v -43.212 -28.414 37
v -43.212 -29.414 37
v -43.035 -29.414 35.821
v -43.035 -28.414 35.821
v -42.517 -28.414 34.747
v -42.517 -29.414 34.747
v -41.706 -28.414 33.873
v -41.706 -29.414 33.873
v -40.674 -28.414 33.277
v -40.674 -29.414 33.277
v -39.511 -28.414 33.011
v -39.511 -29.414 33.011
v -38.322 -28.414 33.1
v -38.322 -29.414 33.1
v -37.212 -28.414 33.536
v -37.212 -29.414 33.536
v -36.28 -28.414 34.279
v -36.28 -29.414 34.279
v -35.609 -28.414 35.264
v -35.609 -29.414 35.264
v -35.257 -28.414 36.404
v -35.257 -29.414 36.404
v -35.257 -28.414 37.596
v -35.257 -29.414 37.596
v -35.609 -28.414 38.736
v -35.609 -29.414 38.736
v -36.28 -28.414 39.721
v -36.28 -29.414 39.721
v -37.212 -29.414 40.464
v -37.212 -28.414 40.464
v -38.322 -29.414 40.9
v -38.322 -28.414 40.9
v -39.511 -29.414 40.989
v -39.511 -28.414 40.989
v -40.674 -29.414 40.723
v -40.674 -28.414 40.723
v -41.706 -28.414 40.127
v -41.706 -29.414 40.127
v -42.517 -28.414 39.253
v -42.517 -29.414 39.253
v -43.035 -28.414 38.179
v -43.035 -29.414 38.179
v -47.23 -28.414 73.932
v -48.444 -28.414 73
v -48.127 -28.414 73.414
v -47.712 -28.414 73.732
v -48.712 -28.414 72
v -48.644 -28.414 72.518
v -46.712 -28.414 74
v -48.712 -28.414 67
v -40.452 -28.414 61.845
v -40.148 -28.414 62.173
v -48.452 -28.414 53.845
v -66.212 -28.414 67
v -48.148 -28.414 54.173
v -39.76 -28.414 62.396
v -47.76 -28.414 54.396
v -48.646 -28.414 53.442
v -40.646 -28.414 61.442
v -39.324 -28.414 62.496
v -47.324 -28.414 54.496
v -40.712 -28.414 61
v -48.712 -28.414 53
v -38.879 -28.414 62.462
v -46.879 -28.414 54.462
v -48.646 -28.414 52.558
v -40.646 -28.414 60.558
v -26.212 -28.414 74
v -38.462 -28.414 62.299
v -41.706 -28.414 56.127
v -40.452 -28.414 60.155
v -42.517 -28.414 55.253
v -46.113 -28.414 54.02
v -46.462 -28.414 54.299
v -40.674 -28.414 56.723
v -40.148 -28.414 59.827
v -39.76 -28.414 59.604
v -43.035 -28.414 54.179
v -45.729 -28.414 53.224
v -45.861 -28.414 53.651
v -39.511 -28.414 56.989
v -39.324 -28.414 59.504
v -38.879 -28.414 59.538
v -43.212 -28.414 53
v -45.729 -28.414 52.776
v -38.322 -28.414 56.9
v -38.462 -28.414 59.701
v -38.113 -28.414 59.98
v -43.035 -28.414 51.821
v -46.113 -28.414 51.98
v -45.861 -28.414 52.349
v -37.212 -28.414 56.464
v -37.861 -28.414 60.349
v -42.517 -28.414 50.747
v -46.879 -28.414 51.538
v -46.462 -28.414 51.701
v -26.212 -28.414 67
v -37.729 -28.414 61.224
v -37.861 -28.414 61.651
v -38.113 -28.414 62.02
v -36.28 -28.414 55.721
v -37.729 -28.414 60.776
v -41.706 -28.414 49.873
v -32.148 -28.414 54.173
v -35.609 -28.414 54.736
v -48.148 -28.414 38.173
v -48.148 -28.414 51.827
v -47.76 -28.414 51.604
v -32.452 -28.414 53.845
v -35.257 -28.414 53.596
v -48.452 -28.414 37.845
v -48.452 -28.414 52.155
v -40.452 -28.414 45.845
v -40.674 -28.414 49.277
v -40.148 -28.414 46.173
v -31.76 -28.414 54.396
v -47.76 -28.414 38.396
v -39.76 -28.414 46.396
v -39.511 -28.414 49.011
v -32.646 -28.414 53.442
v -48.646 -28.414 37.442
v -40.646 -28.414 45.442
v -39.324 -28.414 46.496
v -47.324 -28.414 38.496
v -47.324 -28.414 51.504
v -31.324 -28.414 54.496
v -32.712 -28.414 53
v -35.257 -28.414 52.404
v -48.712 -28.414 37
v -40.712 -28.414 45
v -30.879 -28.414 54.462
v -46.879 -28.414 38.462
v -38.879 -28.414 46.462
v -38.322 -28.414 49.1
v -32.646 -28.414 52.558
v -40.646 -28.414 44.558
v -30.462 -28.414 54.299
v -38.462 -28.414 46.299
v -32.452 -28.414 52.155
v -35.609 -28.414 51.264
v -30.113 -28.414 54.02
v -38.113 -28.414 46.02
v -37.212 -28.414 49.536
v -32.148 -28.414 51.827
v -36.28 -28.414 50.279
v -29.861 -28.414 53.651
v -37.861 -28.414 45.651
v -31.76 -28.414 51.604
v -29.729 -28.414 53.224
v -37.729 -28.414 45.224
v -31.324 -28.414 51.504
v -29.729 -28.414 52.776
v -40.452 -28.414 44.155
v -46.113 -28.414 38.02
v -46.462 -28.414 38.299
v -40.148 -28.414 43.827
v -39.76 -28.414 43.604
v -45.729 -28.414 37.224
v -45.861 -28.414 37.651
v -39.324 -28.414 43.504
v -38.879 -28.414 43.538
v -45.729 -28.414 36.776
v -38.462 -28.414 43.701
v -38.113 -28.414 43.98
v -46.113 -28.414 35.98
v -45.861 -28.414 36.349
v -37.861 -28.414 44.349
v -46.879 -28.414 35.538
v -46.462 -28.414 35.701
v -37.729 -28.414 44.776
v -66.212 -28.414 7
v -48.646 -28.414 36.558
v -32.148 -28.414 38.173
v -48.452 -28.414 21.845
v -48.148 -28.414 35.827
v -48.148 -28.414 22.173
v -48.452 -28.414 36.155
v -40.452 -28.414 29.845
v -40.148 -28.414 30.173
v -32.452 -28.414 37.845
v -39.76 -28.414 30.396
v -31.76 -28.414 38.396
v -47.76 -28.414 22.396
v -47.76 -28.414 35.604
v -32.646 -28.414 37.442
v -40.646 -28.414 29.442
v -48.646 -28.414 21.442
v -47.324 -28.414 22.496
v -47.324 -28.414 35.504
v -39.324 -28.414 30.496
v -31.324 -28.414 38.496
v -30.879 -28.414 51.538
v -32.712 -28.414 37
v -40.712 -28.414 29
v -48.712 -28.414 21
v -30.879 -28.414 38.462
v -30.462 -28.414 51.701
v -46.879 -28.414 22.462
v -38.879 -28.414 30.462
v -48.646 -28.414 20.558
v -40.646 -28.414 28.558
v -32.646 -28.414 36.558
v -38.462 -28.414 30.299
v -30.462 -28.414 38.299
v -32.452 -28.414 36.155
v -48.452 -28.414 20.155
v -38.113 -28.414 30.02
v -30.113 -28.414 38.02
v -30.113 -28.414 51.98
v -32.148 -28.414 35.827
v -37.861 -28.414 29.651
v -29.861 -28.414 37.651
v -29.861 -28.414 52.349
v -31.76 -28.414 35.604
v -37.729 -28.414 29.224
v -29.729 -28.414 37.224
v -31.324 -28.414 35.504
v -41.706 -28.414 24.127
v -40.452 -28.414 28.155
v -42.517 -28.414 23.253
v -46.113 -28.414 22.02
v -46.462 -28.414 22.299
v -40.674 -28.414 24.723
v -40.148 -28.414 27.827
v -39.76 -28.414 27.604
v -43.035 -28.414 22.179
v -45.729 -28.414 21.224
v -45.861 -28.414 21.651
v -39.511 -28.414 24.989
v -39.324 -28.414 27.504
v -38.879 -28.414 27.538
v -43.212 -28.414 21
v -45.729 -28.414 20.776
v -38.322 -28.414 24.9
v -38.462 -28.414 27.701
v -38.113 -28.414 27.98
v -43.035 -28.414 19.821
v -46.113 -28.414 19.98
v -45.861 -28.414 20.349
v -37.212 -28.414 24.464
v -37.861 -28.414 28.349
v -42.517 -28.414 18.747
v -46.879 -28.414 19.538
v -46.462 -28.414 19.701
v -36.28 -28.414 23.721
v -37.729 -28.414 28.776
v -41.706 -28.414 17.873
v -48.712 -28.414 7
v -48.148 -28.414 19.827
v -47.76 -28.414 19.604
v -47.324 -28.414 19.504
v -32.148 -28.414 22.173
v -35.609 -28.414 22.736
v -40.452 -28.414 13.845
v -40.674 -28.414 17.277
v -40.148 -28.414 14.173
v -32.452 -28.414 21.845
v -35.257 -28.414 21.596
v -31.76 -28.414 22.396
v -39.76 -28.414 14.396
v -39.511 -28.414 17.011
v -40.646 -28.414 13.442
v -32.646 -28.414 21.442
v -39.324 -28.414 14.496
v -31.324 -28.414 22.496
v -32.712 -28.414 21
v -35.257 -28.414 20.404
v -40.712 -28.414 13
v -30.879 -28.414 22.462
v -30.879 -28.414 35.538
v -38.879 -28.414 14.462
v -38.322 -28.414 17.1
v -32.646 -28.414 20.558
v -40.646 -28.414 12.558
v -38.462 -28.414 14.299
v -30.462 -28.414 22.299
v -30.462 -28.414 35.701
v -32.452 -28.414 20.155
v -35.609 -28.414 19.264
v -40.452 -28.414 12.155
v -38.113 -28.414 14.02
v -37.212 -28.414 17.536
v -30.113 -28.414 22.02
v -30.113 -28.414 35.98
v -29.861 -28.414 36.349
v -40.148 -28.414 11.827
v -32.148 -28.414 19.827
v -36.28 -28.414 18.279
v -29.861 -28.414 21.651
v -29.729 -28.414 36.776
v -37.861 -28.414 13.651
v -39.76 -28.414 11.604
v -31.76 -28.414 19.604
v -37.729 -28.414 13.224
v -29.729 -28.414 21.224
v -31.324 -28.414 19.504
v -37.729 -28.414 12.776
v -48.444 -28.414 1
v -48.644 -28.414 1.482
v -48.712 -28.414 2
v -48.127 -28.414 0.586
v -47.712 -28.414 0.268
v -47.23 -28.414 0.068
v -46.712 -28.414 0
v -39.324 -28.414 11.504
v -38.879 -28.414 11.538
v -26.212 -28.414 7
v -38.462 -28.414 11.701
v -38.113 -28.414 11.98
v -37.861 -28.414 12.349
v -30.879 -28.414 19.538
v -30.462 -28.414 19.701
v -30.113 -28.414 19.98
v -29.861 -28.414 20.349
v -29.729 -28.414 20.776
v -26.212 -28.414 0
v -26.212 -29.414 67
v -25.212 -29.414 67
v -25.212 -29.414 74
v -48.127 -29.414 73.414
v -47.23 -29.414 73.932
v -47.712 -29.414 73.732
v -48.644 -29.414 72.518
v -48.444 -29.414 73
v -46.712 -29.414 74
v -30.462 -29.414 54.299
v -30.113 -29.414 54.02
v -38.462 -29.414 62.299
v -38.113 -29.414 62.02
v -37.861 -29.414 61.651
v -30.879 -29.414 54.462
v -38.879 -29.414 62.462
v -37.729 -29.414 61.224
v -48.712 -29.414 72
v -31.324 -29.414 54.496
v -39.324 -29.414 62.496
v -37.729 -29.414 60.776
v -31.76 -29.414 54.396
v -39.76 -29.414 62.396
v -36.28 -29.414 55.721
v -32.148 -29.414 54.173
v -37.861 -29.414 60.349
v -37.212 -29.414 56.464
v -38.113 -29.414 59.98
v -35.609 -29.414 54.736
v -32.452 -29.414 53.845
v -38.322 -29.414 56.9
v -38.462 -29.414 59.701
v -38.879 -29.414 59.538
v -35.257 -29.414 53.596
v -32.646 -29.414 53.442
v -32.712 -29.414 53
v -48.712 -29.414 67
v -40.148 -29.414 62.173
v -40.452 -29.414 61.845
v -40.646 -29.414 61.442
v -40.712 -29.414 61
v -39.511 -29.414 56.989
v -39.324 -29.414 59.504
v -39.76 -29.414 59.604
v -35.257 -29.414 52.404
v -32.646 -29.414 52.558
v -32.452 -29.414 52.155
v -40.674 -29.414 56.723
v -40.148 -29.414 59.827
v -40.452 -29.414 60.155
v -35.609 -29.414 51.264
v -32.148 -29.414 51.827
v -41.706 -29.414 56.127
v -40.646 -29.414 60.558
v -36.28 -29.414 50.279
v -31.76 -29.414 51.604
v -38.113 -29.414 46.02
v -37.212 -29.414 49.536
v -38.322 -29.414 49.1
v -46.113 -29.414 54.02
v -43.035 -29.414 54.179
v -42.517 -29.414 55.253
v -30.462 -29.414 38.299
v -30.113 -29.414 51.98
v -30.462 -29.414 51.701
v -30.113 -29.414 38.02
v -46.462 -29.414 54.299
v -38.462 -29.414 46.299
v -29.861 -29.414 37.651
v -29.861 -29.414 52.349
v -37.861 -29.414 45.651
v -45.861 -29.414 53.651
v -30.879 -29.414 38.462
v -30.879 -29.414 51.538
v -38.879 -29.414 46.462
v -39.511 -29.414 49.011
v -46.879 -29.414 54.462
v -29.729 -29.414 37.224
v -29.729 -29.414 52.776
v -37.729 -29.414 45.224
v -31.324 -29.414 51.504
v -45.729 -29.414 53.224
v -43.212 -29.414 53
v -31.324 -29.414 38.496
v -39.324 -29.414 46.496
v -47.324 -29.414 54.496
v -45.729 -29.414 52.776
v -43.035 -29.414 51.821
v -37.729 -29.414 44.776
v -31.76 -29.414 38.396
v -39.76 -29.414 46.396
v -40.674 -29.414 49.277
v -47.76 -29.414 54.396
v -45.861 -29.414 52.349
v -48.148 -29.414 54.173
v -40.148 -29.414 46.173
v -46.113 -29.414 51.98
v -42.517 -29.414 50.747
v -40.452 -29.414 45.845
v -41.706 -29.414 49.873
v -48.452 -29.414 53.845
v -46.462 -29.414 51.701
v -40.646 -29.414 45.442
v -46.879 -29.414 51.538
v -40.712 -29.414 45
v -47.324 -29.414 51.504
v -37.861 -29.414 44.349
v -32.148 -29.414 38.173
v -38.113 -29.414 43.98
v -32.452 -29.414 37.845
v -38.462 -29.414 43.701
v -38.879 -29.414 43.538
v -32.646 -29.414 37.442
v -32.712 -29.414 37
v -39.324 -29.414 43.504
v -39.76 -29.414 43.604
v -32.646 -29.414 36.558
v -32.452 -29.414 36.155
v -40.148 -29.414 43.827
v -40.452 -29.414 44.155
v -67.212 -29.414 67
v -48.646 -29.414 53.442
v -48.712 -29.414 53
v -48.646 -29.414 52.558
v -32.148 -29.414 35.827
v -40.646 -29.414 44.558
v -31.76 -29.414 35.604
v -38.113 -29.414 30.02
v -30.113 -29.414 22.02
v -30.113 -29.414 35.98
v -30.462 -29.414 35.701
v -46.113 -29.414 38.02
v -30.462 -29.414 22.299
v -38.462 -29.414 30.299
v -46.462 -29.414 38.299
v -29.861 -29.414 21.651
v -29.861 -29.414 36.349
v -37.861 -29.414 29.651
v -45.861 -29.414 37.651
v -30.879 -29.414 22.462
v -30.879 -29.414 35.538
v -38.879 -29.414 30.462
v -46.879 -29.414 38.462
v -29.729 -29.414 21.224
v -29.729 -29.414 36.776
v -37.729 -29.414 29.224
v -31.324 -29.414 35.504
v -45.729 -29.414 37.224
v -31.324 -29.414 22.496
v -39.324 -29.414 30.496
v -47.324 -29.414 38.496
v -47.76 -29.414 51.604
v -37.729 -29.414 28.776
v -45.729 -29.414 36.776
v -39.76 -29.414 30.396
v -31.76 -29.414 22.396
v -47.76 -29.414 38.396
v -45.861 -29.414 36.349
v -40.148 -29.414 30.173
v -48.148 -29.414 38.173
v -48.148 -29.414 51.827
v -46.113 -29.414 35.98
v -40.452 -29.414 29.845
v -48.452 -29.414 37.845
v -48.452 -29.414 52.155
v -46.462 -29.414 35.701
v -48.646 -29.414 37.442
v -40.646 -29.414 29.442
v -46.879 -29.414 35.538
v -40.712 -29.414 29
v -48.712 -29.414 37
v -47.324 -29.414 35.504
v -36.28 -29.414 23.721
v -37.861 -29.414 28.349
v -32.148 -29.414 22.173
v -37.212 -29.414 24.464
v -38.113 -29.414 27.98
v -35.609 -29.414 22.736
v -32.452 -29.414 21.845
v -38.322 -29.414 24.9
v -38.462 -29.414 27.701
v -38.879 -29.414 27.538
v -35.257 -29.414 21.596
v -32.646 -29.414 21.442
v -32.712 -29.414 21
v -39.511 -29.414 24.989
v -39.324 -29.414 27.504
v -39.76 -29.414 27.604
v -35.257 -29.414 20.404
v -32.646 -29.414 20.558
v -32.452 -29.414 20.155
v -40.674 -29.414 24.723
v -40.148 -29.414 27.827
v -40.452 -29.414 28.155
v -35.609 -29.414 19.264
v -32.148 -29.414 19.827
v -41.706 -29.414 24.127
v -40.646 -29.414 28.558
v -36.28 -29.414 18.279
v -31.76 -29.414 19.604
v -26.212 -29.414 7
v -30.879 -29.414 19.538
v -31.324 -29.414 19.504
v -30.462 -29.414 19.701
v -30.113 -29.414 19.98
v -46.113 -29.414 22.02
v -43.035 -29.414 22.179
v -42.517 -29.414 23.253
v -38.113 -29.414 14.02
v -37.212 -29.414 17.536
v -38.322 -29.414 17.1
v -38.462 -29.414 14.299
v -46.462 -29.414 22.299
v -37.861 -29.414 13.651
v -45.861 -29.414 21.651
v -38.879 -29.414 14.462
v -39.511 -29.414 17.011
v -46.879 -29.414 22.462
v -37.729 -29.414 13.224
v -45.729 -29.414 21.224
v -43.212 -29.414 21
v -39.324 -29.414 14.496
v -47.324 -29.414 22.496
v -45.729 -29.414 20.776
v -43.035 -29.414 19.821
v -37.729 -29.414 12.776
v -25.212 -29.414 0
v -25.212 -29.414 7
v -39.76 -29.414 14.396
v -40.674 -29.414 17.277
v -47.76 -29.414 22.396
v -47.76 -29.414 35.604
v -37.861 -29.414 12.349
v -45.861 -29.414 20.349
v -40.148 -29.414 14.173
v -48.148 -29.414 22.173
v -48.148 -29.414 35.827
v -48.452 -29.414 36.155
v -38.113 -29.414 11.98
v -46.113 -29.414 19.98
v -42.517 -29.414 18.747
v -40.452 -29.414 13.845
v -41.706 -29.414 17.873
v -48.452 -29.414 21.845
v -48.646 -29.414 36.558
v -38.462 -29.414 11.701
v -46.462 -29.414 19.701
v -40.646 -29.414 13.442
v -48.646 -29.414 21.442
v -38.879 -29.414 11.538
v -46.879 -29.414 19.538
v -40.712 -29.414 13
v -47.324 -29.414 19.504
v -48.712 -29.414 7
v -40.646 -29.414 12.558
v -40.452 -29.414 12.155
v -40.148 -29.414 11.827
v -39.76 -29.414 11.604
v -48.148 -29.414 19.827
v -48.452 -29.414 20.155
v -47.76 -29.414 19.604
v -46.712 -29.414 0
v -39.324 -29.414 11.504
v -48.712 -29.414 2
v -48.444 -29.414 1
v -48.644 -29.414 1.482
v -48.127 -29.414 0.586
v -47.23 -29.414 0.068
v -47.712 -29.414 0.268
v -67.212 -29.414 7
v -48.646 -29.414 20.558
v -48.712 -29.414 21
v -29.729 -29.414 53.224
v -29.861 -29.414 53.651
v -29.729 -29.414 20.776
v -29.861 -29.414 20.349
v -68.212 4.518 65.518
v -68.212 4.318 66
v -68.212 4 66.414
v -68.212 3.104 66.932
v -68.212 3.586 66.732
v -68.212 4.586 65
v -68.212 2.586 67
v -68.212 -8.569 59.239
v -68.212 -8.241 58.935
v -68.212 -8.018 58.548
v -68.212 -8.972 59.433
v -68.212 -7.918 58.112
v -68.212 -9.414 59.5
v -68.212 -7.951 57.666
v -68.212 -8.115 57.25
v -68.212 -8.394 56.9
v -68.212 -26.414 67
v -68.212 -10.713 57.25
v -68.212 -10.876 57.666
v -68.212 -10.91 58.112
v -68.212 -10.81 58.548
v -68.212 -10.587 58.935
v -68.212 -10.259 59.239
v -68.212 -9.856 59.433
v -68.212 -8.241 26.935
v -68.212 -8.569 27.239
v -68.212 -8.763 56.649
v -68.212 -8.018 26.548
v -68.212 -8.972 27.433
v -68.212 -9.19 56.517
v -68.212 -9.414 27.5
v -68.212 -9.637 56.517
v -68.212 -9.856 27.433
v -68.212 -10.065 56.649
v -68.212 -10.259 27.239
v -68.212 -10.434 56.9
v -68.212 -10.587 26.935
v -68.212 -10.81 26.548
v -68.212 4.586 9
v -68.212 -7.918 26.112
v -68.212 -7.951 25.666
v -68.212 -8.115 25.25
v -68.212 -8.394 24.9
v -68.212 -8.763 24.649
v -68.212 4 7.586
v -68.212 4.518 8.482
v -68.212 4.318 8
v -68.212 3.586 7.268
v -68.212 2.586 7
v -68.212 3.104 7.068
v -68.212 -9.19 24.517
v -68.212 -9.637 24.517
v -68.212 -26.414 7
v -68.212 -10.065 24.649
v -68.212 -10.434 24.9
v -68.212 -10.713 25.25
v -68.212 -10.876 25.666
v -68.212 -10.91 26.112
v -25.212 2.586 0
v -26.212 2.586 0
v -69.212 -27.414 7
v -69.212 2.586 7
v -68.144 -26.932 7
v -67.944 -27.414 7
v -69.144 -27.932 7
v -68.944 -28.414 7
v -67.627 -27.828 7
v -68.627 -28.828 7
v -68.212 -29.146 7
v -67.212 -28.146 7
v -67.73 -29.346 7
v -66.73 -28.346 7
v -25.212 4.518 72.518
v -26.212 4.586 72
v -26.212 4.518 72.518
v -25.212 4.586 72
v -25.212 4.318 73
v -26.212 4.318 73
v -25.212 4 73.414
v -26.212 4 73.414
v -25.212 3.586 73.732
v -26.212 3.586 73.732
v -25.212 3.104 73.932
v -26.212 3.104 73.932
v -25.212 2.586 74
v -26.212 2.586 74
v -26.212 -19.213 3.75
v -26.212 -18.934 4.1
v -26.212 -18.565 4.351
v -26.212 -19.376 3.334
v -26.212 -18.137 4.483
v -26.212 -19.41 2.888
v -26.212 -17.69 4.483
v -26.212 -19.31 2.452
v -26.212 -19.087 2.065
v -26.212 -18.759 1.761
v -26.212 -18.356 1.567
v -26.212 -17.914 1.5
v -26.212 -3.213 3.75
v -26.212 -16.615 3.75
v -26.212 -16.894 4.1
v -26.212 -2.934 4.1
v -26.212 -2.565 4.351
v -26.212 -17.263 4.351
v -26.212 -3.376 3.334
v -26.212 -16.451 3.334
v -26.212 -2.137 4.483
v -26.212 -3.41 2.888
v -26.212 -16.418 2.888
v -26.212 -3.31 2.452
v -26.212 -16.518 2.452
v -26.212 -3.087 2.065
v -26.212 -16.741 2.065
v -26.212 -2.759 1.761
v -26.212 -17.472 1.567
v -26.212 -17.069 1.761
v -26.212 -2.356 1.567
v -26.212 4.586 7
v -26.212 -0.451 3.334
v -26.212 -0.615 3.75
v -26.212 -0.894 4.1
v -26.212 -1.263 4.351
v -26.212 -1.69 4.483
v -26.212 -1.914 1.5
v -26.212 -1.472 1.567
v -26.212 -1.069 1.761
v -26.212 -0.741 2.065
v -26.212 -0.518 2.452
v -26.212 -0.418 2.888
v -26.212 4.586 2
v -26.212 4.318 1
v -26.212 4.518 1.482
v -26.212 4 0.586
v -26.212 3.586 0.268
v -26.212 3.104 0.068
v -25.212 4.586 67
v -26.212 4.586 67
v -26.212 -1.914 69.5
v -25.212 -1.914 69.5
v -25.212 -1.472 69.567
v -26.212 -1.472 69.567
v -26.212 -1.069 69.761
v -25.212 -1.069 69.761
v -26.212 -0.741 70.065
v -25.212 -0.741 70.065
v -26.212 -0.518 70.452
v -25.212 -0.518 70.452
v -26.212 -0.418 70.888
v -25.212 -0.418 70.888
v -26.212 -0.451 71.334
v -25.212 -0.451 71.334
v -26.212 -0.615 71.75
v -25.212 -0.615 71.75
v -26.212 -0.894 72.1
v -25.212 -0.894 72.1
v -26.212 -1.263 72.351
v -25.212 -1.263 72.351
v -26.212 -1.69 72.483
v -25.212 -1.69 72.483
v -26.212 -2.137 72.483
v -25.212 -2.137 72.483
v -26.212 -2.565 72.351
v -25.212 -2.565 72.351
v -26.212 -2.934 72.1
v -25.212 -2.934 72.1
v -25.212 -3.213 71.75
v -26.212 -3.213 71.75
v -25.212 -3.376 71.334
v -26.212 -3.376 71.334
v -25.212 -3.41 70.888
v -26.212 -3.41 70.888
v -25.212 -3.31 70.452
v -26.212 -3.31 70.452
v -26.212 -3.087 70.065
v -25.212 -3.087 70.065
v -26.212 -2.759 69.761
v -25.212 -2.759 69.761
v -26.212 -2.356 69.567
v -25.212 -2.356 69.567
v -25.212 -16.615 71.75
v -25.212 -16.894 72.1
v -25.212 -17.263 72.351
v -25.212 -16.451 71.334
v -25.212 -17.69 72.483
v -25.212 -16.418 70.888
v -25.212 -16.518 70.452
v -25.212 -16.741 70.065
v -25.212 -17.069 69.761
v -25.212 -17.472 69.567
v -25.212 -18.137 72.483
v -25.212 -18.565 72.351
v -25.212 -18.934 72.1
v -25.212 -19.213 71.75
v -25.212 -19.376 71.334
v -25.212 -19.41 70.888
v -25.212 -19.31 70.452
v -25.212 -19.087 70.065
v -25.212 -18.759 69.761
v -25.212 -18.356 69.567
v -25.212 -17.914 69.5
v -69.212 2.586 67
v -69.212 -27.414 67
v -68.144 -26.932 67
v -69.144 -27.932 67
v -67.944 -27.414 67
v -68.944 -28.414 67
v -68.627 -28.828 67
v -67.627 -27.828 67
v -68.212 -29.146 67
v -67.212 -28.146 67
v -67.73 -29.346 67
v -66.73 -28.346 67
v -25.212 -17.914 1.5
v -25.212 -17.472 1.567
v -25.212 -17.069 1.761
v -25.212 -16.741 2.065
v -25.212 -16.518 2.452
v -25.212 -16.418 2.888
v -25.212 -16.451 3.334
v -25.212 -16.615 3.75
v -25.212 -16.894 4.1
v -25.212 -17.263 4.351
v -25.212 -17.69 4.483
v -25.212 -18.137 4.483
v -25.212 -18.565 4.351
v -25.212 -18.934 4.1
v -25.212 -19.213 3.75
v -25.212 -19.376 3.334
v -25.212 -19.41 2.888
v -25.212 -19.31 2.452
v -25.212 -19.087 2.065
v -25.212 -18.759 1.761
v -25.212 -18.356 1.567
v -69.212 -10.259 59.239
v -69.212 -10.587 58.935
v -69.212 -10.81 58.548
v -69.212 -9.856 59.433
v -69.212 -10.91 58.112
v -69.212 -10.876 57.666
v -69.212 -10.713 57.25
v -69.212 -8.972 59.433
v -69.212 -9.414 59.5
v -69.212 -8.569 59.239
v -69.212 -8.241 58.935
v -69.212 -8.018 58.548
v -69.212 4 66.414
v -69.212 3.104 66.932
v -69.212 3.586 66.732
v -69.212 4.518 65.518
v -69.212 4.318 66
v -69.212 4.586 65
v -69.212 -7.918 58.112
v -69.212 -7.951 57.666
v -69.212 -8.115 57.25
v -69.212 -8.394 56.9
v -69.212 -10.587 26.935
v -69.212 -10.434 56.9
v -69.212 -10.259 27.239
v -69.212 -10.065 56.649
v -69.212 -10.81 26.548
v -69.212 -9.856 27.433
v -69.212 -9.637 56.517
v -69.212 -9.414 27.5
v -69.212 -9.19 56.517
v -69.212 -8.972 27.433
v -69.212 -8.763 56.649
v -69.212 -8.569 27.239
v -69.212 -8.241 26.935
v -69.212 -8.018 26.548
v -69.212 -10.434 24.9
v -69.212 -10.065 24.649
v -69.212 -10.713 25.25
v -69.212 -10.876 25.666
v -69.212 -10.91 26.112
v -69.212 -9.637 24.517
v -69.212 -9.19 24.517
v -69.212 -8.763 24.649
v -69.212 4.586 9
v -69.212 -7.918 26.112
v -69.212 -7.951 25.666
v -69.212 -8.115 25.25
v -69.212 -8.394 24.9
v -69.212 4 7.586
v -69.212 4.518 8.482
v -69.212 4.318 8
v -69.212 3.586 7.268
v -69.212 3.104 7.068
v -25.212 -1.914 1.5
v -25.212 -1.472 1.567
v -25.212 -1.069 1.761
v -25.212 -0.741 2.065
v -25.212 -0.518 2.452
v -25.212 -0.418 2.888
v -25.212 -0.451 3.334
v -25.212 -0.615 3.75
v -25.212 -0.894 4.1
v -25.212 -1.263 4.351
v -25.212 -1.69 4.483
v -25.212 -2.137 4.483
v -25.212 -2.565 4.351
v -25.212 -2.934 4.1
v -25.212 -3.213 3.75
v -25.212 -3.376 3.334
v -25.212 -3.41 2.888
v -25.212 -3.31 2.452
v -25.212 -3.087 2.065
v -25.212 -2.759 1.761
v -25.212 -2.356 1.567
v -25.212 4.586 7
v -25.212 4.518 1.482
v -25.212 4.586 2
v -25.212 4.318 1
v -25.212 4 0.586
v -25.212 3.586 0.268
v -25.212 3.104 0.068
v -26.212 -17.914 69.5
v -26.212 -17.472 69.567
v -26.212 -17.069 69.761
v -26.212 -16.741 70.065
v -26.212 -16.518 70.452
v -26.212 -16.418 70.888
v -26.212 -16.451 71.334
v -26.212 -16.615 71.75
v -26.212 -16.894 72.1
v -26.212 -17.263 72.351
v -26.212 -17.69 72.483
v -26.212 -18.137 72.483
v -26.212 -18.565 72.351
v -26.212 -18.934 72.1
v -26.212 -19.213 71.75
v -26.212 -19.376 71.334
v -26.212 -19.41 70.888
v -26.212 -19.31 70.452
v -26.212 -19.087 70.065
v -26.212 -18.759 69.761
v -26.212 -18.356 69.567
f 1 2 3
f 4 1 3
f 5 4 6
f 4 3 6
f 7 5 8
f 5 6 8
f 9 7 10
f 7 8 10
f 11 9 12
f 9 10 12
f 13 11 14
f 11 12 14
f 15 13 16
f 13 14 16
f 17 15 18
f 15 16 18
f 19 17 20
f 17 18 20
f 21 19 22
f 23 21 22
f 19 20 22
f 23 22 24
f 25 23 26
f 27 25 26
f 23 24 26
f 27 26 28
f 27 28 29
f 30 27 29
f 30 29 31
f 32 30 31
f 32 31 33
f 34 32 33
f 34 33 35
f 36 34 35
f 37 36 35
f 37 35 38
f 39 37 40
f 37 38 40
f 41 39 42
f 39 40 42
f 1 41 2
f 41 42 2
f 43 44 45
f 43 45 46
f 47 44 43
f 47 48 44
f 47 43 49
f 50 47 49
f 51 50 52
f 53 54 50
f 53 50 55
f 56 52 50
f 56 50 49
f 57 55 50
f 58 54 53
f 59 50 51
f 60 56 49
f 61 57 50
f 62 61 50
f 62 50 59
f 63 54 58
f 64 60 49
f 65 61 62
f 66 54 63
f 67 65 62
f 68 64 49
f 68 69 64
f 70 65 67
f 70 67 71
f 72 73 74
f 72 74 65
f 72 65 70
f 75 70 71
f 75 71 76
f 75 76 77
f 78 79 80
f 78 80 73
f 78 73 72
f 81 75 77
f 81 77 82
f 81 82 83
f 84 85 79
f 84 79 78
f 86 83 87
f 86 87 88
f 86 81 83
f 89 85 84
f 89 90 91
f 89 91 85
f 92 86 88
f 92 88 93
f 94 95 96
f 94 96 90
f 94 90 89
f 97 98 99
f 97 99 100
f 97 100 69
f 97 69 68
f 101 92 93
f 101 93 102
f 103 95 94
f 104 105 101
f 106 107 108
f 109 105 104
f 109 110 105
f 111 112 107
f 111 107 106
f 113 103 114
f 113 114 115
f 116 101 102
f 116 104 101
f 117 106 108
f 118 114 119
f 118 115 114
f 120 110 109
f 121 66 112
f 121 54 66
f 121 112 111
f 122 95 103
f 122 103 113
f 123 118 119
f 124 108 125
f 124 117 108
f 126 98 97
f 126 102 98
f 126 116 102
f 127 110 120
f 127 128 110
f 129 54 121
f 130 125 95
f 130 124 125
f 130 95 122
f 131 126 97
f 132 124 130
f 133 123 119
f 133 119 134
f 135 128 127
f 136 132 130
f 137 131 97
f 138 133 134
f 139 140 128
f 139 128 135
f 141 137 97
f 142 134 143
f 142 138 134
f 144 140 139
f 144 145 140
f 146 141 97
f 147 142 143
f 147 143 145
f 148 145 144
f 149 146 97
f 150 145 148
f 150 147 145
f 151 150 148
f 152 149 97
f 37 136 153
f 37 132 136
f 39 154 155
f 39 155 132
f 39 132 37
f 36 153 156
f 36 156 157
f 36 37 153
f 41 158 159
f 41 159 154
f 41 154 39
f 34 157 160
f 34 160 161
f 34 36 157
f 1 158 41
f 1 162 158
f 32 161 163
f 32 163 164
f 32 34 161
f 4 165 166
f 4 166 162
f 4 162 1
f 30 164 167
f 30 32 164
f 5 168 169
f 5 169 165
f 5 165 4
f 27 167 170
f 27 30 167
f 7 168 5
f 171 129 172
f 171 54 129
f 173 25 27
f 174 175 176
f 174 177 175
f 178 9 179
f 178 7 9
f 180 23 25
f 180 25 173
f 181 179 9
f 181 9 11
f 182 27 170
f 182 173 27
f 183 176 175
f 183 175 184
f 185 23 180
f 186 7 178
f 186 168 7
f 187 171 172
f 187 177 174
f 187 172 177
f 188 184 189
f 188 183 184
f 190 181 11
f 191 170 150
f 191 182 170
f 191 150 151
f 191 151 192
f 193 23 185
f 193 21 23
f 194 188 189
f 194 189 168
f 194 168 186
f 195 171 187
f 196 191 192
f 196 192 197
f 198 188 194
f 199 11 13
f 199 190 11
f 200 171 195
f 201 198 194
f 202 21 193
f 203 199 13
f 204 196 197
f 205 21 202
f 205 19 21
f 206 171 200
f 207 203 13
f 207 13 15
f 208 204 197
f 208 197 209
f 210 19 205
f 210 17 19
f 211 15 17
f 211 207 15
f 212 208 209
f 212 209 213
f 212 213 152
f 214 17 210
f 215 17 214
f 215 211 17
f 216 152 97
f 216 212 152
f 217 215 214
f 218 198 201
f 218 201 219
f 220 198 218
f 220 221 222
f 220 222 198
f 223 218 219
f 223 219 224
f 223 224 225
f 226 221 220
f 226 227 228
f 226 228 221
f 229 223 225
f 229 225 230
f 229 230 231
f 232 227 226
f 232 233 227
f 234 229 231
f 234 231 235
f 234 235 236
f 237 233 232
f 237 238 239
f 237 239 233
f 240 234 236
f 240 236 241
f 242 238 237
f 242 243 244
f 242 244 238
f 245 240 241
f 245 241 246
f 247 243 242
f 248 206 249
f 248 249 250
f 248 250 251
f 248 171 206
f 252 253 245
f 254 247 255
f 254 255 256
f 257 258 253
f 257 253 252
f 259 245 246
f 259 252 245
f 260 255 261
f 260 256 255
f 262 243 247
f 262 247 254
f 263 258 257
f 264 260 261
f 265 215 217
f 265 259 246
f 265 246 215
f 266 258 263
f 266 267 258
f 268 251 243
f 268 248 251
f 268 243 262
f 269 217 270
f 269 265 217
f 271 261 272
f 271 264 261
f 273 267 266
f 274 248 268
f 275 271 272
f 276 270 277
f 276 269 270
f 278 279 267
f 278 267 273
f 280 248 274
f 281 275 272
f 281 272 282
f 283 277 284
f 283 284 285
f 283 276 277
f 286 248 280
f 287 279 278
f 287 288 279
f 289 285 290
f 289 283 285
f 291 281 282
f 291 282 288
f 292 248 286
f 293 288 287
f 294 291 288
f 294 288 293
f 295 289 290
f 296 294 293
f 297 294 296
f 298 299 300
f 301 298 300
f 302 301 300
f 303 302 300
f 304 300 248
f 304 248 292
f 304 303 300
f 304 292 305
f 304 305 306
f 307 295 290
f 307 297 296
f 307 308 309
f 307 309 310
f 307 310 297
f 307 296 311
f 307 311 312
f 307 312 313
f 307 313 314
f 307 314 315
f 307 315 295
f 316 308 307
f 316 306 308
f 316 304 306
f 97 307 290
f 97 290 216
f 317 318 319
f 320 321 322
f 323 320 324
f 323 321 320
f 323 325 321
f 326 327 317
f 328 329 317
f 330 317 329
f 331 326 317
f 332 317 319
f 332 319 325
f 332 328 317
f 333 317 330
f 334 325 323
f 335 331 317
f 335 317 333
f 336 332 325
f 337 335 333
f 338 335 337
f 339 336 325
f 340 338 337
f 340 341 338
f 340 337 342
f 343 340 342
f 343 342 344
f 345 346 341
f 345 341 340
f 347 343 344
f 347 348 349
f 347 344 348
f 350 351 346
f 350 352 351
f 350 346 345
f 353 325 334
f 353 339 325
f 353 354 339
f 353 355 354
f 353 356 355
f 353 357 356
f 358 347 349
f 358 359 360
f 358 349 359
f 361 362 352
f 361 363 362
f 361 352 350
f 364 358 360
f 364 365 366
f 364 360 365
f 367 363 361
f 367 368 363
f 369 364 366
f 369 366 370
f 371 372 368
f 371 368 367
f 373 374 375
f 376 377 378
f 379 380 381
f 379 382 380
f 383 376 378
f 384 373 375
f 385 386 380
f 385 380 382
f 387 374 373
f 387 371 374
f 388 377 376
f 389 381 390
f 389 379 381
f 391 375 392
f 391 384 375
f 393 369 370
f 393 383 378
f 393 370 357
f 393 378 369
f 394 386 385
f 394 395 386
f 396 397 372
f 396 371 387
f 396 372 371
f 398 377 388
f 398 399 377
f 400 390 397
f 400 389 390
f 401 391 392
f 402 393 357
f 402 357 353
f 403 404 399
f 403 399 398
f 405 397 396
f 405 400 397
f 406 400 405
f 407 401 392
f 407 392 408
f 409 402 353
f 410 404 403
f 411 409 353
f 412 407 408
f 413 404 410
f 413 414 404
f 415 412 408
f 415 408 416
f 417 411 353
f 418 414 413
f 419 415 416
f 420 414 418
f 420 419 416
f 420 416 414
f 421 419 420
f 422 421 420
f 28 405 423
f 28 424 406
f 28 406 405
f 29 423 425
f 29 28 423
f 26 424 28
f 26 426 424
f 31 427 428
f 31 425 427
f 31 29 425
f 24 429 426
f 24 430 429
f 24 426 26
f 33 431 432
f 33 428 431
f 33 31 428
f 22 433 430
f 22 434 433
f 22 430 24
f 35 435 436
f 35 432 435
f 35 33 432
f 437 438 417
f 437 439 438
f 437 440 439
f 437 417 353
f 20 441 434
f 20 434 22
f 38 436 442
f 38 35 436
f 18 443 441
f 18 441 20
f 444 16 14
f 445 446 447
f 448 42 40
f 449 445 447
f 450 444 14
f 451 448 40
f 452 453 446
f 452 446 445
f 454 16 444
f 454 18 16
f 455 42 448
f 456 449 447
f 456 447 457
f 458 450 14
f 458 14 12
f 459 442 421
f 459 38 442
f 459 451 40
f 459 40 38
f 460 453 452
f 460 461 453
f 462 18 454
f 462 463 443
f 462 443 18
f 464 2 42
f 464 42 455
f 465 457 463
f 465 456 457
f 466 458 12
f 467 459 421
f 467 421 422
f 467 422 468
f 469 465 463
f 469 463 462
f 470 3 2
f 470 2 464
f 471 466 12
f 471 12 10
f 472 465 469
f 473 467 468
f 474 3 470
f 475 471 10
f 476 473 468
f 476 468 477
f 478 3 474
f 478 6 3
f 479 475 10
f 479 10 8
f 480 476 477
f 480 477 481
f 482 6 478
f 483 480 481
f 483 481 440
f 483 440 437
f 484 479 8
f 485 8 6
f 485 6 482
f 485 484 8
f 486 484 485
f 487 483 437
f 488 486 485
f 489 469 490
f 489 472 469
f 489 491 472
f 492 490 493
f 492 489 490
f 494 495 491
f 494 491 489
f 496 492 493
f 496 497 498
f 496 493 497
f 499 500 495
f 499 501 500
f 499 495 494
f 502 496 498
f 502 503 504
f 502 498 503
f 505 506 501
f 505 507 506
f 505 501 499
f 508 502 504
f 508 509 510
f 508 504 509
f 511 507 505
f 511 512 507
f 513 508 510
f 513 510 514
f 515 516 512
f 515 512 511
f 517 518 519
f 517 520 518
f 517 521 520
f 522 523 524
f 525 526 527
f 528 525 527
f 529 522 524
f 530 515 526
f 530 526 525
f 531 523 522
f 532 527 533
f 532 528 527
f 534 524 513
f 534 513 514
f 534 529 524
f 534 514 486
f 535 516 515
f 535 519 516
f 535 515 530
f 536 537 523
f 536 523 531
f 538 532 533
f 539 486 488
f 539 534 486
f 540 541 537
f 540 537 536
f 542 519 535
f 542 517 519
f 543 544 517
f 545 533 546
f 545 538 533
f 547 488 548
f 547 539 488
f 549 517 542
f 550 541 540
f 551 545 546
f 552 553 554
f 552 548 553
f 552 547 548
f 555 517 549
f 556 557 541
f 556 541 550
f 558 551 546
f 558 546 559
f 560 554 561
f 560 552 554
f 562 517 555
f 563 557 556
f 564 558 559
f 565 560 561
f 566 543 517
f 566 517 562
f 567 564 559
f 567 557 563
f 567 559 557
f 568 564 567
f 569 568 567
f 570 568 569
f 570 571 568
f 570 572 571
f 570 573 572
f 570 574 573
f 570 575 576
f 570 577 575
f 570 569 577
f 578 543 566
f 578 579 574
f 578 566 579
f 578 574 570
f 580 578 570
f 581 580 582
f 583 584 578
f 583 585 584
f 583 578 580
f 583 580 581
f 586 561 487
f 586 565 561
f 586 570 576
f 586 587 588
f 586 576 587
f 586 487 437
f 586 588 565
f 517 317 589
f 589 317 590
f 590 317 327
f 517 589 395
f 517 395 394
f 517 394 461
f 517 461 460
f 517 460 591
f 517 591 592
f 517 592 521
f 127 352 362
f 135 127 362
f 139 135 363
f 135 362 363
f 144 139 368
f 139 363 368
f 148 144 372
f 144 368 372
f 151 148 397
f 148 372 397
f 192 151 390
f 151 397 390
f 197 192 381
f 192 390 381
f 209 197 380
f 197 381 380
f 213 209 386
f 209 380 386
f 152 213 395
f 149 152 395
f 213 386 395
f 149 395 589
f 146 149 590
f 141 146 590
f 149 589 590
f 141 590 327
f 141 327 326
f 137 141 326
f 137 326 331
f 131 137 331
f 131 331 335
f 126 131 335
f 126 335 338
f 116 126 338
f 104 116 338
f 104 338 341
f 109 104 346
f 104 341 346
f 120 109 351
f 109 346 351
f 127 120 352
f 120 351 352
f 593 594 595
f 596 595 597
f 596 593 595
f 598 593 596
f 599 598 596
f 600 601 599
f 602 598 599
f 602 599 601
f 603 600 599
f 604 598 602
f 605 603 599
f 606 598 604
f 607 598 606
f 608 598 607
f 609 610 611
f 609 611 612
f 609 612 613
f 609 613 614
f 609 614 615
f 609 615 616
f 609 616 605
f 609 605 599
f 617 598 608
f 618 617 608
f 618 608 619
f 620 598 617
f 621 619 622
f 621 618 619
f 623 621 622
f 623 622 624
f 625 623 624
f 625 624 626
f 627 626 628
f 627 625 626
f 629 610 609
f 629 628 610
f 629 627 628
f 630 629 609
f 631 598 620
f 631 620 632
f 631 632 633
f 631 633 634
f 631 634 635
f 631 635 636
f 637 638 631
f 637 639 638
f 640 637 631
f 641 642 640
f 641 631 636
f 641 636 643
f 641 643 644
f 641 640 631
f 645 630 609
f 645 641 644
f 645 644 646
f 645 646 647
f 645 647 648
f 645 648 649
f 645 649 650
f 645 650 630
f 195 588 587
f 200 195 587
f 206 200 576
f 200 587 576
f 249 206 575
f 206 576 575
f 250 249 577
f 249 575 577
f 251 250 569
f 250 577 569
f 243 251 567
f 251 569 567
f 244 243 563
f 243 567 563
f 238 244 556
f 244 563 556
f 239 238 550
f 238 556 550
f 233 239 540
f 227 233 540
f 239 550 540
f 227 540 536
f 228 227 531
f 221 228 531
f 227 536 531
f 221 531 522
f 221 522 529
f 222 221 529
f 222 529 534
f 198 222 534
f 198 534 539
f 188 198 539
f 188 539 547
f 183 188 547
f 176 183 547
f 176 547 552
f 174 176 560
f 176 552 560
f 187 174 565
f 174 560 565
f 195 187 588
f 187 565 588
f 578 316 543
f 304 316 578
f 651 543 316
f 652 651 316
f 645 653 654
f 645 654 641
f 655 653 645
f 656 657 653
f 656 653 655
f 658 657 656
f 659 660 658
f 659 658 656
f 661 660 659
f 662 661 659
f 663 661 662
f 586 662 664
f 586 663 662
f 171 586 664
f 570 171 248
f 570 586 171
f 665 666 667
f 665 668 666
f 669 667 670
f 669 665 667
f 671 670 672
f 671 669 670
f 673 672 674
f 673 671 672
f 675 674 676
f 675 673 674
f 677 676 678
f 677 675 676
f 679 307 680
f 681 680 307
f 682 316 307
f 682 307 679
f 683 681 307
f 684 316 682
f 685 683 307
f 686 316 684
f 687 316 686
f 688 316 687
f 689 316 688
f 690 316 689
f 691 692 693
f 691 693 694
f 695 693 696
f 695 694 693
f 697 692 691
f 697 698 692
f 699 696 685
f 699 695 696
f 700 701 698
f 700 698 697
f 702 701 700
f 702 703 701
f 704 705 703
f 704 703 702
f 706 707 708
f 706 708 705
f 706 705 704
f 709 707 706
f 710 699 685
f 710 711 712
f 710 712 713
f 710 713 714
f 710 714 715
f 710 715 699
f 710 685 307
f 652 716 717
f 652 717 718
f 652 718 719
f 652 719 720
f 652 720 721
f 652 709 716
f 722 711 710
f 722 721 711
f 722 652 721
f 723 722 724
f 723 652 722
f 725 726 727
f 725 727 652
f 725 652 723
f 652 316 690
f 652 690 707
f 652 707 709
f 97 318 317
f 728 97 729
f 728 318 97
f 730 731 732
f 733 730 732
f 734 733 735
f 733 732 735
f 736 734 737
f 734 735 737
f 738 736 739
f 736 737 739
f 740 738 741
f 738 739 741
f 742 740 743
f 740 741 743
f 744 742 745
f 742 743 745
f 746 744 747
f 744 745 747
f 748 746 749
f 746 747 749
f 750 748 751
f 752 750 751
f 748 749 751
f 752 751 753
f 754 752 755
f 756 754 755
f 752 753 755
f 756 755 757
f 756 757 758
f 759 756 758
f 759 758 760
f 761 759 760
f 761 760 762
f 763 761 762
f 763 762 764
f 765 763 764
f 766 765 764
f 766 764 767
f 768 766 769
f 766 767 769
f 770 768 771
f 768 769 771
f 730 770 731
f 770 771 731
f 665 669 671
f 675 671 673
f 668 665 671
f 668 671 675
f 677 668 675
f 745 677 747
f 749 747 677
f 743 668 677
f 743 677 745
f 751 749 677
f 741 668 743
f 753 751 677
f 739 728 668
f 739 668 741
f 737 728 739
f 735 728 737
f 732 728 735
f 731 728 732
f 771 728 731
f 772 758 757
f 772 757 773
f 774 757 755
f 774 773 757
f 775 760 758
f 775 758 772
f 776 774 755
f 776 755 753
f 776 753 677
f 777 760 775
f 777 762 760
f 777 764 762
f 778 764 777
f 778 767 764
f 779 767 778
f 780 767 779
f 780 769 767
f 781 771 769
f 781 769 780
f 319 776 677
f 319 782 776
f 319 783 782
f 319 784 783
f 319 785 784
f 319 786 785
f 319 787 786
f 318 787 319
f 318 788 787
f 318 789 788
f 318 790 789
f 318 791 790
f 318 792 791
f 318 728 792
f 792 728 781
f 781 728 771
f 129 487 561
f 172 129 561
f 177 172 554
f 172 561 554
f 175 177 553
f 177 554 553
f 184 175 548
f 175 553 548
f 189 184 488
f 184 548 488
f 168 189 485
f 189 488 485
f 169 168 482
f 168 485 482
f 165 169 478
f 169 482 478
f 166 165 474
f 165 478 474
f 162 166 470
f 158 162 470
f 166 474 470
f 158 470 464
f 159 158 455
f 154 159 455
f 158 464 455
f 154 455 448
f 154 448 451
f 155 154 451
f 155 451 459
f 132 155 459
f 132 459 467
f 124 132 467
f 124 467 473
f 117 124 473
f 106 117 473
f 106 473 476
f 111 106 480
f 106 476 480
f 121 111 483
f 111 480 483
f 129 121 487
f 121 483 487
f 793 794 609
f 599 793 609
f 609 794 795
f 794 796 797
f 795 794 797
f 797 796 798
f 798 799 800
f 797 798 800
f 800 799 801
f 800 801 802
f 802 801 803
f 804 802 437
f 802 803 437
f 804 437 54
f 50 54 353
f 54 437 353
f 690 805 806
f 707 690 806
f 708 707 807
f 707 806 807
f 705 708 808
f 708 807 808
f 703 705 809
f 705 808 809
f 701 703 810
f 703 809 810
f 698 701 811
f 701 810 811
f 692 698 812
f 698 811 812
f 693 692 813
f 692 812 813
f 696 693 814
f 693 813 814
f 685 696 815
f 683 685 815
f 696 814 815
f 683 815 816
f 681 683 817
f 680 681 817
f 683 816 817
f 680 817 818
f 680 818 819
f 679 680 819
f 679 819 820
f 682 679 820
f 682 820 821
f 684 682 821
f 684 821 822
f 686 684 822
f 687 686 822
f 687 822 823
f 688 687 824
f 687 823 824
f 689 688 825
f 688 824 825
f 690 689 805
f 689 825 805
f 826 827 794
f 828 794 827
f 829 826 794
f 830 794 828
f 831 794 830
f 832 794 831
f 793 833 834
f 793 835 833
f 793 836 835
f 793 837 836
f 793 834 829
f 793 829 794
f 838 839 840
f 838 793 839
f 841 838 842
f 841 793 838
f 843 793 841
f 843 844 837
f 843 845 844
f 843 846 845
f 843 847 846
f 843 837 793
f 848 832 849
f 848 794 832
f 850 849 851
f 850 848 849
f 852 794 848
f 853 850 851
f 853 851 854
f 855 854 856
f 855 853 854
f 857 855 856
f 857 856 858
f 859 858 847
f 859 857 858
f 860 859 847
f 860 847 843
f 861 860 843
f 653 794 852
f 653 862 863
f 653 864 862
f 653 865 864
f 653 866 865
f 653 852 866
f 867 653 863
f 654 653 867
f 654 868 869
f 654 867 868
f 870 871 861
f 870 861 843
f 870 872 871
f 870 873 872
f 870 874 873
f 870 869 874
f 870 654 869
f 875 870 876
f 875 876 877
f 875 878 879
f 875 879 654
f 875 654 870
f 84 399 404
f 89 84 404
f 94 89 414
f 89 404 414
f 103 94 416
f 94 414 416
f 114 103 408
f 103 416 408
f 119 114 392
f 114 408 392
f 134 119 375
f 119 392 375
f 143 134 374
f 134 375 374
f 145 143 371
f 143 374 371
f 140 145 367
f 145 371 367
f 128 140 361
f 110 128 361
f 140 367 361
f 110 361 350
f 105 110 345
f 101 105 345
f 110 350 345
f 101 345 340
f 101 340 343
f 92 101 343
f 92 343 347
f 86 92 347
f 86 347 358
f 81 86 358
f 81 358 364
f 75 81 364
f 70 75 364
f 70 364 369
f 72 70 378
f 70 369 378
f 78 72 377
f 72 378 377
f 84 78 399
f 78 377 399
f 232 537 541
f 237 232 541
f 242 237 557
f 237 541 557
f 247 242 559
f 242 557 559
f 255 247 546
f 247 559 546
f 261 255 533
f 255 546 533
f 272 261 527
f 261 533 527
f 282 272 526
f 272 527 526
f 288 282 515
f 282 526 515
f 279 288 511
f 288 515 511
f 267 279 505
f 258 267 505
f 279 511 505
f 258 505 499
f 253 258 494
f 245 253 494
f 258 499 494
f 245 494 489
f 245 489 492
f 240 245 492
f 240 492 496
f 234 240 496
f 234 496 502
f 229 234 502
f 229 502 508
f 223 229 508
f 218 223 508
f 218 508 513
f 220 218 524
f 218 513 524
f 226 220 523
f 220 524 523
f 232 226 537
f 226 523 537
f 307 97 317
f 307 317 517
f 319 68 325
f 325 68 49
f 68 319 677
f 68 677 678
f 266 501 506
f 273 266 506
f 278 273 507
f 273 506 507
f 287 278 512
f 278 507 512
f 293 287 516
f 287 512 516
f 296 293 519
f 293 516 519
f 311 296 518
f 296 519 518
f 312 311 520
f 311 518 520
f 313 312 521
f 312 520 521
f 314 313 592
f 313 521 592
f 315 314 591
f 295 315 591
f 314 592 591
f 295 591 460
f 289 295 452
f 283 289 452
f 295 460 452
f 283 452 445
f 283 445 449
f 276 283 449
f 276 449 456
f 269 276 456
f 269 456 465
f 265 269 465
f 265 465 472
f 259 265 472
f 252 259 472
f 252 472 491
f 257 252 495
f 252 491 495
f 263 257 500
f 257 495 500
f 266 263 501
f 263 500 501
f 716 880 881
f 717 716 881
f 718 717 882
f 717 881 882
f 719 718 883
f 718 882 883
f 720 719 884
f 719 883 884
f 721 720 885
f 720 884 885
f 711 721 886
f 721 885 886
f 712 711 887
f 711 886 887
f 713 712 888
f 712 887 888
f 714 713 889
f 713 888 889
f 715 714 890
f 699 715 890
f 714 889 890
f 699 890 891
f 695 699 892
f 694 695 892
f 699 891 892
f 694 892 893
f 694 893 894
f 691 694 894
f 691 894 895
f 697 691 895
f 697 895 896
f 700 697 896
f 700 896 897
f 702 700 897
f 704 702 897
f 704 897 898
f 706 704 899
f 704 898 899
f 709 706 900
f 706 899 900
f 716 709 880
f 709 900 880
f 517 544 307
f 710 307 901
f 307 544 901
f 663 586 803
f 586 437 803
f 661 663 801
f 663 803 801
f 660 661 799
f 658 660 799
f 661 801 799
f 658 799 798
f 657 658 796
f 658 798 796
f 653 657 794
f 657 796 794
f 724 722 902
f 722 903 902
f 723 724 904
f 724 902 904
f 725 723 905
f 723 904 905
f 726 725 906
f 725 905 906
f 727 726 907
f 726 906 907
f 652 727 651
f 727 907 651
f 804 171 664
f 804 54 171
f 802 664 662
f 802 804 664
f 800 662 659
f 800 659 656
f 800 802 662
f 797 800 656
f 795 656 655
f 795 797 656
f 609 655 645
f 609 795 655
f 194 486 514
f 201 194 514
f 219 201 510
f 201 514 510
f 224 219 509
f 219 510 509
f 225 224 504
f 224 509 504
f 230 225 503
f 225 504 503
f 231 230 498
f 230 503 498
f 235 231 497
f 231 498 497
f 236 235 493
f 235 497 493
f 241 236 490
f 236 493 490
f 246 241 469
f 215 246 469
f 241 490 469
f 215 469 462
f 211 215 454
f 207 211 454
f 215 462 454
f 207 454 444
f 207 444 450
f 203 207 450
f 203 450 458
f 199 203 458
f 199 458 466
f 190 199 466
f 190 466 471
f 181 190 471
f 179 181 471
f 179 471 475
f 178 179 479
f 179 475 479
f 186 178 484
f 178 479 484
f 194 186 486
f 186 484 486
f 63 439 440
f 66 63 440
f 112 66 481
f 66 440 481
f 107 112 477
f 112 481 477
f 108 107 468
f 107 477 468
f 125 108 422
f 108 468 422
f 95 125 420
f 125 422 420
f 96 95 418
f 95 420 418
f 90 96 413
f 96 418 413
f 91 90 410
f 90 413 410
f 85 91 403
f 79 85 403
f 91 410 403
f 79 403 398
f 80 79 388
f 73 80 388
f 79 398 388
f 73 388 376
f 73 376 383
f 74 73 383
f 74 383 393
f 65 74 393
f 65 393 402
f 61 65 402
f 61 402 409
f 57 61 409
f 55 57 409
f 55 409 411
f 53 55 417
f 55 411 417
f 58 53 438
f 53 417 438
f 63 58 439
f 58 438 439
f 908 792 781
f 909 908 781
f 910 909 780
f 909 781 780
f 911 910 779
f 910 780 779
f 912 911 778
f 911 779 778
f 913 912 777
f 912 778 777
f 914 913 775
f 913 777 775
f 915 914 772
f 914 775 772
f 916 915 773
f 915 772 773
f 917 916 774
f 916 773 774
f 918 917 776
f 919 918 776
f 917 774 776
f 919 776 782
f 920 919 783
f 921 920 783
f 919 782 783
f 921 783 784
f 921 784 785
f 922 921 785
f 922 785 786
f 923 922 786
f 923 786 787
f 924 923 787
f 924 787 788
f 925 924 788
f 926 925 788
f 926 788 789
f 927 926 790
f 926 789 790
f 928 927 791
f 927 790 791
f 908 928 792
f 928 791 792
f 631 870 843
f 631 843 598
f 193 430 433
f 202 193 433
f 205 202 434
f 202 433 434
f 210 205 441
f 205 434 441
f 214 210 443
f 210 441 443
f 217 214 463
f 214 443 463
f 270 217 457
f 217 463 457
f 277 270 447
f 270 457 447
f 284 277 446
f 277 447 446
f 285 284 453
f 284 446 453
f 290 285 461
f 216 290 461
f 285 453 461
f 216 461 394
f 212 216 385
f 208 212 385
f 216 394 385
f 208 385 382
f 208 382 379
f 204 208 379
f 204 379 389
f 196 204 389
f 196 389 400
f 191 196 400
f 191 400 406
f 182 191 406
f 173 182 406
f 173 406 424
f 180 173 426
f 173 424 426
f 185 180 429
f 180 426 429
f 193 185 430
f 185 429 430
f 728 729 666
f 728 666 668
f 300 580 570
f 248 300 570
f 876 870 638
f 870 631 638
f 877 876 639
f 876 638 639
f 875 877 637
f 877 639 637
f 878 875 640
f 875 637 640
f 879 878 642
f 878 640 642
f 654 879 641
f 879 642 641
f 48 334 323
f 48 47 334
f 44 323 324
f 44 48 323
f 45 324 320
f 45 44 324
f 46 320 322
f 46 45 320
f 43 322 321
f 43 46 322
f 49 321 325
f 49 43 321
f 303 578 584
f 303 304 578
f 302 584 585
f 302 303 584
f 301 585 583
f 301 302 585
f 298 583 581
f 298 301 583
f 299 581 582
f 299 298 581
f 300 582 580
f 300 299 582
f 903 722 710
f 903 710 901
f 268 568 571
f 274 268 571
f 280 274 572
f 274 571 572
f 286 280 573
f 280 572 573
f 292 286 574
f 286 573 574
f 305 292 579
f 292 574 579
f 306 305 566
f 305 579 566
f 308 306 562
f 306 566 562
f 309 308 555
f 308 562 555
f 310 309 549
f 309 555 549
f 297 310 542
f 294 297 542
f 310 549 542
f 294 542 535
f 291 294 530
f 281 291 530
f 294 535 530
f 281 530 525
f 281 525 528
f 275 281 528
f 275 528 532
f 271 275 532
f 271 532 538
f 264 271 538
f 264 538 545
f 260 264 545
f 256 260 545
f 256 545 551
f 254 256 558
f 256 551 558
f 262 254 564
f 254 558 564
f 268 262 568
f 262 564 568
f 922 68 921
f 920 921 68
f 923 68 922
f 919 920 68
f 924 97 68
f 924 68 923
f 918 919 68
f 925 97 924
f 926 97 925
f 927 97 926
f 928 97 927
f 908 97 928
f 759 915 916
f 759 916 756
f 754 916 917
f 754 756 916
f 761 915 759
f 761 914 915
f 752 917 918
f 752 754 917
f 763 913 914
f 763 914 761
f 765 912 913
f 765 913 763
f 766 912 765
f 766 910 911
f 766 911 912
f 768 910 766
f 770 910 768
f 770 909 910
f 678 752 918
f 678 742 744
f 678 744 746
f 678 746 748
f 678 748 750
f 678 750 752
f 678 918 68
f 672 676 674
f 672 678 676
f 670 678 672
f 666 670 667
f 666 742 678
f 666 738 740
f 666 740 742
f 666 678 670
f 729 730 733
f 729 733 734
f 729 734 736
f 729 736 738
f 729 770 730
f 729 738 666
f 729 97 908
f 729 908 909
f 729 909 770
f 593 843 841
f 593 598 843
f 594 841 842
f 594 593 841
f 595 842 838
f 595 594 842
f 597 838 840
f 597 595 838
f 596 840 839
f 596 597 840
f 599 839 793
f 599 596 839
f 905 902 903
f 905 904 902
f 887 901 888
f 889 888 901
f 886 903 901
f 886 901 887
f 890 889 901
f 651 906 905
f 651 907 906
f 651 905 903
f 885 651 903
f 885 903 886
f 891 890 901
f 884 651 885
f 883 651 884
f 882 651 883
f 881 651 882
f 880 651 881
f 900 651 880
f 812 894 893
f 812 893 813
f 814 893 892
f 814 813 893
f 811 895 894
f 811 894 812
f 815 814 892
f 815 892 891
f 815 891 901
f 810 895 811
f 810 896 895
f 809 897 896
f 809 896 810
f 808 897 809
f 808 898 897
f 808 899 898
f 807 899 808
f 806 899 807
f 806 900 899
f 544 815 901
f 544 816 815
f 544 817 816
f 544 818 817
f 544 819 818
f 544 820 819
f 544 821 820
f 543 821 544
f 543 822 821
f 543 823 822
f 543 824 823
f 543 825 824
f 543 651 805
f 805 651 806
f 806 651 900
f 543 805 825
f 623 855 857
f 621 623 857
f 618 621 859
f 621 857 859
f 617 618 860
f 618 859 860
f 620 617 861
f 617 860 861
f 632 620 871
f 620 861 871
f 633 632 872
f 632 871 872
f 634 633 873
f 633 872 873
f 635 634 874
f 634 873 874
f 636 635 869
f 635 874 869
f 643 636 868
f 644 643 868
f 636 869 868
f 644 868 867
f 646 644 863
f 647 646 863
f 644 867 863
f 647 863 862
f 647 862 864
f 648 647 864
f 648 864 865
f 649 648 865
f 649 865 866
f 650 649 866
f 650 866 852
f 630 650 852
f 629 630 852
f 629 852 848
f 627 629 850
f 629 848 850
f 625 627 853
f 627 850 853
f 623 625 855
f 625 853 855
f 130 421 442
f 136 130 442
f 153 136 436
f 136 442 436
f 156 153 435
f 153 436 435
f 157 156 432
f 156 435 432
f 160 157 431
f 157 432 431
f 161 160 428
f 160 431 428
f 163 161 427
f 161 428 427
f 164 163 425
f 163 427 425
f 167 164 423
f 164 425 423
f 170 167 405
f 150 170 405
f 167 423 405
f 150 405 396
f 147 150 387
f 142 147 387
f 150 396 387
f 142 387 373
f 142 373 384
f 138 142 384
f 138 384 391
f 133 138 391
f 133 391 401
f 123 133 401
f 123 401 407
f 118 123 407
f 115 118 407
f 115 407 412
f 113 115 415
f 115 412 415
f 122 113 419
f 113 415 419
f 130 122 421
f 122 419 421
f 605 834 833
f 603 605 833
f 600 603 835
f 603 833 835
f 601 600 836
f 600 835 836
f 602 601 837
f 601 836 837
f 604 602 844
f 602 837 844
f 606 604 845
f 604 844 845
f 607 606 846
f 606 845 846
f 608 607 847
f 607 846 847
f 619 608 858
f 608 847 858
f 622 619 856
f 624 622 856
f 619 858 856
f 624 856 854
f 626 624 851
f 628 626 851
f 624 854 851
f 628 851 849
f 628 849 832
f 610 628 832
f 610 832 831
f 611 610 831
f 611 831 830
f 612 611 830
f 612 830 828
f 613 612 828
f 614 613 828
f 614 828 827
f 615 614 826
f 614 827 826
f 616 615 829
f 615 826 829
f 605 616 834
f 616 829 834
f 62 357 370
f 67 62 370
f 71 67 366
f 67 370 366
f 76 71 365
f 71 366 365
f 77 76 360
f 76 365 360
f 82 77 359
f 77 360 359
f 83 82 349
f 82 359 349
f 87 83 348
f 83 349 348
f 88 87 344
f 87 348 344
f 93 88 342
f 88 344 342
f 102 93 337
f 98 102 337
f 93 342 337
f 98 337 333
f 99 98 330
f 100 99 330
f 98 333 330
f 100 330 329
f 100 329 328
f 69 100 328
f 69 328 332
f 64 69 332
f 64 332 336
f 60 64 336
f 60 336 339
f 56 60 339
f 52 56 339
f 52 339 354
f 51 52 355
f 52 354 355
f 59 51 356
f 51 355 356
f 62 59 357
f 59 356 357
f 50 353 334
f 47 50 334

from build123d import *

# Parameters (mm, degrees)
BOSS_EXTRUDE1_DEPTH = 74
SKETCH2_R           = 1.5
CUT_EXTRUDE1_DEPTH  = 1
SKETCH4_W           = 60
SKETCH4_H           = 34
CUT_EXTRUDE2_DEPTH  = 1
SKETCH6_W           = 7
SKETCH6_H           = 34
CUT_EXTRUDE3_DEPTH  = 1
SKETCH7_R           = 1.5
CUT_EXTRUDE4_DEPTH  = 1
SKETCH8_R           = 4
SKETCH8_R_2         = 1.5
CUT_EXTRUDE5_DEPTH  = 1
SKETCH9_W           = 19.5
SKETCH9_H           = 7
CUT_EXTRUDE6_DEPTH  = 1
FILLET1_R           = 2


with BuildPart() as part:
    # Sketch1 → Boss-Extrude1 (new body)
    with BuildSketch(Plane.XY):
        Polygon((-68.212386303, 4.586111111), (-68.212386303, -28.413888889), (-26.212386303, -28.413888889), (-26.212386303, 4.586111111), (-25.212386303, 4.586111111), (-25.212386303, -29.413888889), (-69.212386303, -29.413888889), (-69.212386303, 4.586111111), align=None)
    extrude(amount=BOSS_EXTRUDE1_DEPTH)

    # Sketch2 → Cut-Extrude1 (cut)
    with BuildSketch(Plane(origin=(-25.212386303, 0, 0), x_dir=(0, 0, -1), z_dir=(1, 0, 0))):
        with Locations((-3, -1.913888889)):
            Circle(SKETCH2_R)
        with Locations((-71, -1.913888889)):
            Circle(SKETCH2_R)
        with Locations((-71, -17.913888889)):
            Circle(SKETCH2_R)
        with Locations((-3, -17.913888889)):
            Circle(SKETCH2_R)
    extrude(amount=-CUT_EXTRUDE1_DEPTH, mode=Mode.SUBTRACT)

    # Sketch4 → Cut-Extrude2 (cut)
    with BuildSketch(Plane(origin=(-25.212386303, 0, 0), x_dir=(0, 0, -1), z_dir=(1, 0, 0))):
        with Locations((-37, -12.413888889)):
            Rectangle(SKETCH4_W, SKETCH4_H)
    extrude(amount=-CUT_EXTRUDE2_DEPTH, mode=Mode.SUBTRACT)

    # Sketch6 → Cut-Extrude3 (cut)
    with BuildSketch(Plane.ZY.offset(69.212386303)):
        with Locations((3.5, -12.413888889)):
            Rectangle(SKETCH6_W, SKETCH6_H)
        with Locations((70.5, -12.413888889)):
            Rectangle(SKETCH6_W, SKETCH6_H)
    extrude(amount=-CUT_EXTRUDE3_DEPTH, mode=Mode.SUBTRACT)

    # Sketch7 → Cut-Extrude4 (cut)
    with BuildSketch(Plane.ZY.offset(69.212386303)):
        with Locations((58, -9.413888889)):
            Circle(SKETCH7_R)
        with Locations((26, -9.413888889)):
            Circle(SKETCH7_R)
    extrude(amount=-CUT_EXTRUDE4_DEPTH, mode=Mode.SUBTRACT)

    # Sketch8 → Cut-Extrude5 (cut)
    with BuildSketch(Plane(origin=(0, -29.413888889, 0), x_dir=(-1, 0, 0), z_dir=(0, -1, 0))):
        with Locations((39.212386303, -37)):
            Circle(SKETCH8_R)
        with Locations((39.212386303, -29)):
            Circle(SKETCH8_R_2)
        with Locations((47.212386303, -37)):
            Circle(SKETCH8_R_2)
        with Locations((39.212386303, -45)):
            Circle(SKETCH8_R_2)
        with Locations((31.212386303, -37)):
            Circle(SKETCH8_R_2)
        with Locations((31.212386303, -21)):
            Circle(SKETCH8_R_2)
        with Locations((39.212386303, -13)):
            Circle(SKETCH8_R_2)
        with Locations((47.212386303, -21)):
            Circle(SKETCH8_R_2)
        with Locations((39.212386303, -21)):
            Circle(SKETCH8_R)
        with Locations((39.212386303, -61)):
            Circle(SKETCH8_R_2)
        with Locations((39.212386303, -53)):
            Circle(SKETCH8_R)
        with Locations((47.212386303, -53)):
            Circle(SKETCH8_R_2)
        with Locations((31.212386303, -53)):
            Circle(SKETCH8_R_2)
    extrude(amount=-CUT_EXTRUDE5_DEPTH, mode=Mode.SUBTRACT)

    # Sketch9 → Cut-Extrude6 (cut)
    with BuildSketch(Plane.XZ.offset(29.413888889)):
        with Locations((-58.462386303, 3.5)):
            Rectangle(SKETCH9_W, SKETCH9_H)
        with Locations((-58.462386303, 70.5)):
            Rectangle(SKETCH9_W, SKETCH9_H)
    extrude(amount=-CUT_EXTRUDE6_DEPTH, mode=Mode.SUBTRACT)

    # Fillet1
    fillet1_edges = [part.edges().sort_by_distance(p)[0] for p in [
        (-48.712386303, -28.913888889, 0),
        (-25.712386303, 4.586111111, 74),
        (-48.712386303, -28.913888889, 74),
        (-68.712386303, 4.586111111, 7),
        (-68.212386303, -28.413888889, 37),
        (-69.212386303, -29.413888889, 37),
        (-68.712386303, 4.586111111, 67),
        (-25.712386303, 4.586111111, 0),
    ]]
    fillet(fillet1_edges, radius=FILLET1_R)


solid = part.part
